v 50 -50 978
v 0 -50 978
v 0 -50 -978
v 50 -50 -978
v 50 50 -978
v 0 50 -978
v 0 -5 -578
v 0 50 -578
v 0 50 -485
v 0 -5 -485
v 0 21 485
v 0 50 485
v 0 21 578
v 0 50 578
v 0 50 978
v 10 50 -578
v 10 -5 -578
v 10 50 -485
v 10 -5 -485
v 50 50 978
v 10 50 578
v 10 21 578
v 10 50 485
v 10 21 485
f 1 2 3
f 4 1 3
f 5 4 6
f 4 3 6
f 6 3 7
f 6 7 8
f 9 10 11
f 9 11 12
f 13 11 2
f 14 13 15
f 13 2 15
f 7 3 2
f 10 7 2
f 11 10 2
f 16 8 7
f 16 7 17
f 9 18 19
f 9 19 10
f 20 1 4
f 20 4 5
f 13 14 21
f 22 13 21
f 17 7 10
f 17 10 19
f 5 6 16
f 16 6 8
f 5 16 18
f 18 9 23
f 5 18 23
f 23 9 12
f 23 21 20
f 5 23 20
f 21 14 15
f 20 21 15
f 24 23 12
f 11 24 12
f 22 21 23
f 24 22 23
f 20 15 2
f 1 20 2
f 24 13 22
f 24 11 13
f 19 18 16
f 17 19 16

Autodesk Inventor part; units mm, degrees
ref_plane "YZ Plane" through (0, 0, 0) normal (1, 0, 0) x (0, 1, 0)
ref_plane "XZ Plane" through (0, 0, 0) normal (0, 1, 0) x (-1, 0, 0)
ref_plane "XY Plane" through (0, 0, 0) normal (0, 0, 1) x (1, 0, 0)
sketch "Эскиз1" plane through (0, 0, 0) normal (1, 0, 0) x (0, 1, 0)
  line L0 (-50, -978) -> (50, -978)
  line L1 (50, -978) -> (50, 978)
  line L2 (50, 978) -> (-50, 978)
  line L3 (-50, 978) -> (-50, -978)
  line L4 (-50, -978) -> (50, 978) construction
  line L5 (50, -978) -> (-50, 978) construction
  point P0 (0, 0)
  dimension "d0" = 100
  dimension "d1" = 1956
extrude "Выдавливание1" add sketch "Эскиз1" along normal blind 50
sketch "Эскиз2" plane through (0, 50, 978) normal (0, 1, 0) x (1, 0, 0)
  line L0 (0, 1556) -> (10, 1556)
  line L1 (10, 1463) -> (0, 1463)
  line L2 (10, 1463) -> (10, 1556)
  line L3 (0, 1556) -> (0, 1463)
  point P0 (0, 978)
extrude "Выдавливание2" cut sketch "Эскиз2" against normal blind 55
sketch "Эскиз3" plane through (0, 50, 978) normal (0, 1, 0) x (1, 0, 0)
  line L0 (10, 493) -> (-0.0484, 493)
  line L1 (0, 400) -> (10, 400)
  line L2 (10, 400) -> (10, 493)
  line L3 (-0.0484, 493) -> (0, 400)
  point P0 (0, 978)
extrude "Выдавливание3" cut sketch "Эскиз3" against normal blind 29
properties part number "side_panel"
